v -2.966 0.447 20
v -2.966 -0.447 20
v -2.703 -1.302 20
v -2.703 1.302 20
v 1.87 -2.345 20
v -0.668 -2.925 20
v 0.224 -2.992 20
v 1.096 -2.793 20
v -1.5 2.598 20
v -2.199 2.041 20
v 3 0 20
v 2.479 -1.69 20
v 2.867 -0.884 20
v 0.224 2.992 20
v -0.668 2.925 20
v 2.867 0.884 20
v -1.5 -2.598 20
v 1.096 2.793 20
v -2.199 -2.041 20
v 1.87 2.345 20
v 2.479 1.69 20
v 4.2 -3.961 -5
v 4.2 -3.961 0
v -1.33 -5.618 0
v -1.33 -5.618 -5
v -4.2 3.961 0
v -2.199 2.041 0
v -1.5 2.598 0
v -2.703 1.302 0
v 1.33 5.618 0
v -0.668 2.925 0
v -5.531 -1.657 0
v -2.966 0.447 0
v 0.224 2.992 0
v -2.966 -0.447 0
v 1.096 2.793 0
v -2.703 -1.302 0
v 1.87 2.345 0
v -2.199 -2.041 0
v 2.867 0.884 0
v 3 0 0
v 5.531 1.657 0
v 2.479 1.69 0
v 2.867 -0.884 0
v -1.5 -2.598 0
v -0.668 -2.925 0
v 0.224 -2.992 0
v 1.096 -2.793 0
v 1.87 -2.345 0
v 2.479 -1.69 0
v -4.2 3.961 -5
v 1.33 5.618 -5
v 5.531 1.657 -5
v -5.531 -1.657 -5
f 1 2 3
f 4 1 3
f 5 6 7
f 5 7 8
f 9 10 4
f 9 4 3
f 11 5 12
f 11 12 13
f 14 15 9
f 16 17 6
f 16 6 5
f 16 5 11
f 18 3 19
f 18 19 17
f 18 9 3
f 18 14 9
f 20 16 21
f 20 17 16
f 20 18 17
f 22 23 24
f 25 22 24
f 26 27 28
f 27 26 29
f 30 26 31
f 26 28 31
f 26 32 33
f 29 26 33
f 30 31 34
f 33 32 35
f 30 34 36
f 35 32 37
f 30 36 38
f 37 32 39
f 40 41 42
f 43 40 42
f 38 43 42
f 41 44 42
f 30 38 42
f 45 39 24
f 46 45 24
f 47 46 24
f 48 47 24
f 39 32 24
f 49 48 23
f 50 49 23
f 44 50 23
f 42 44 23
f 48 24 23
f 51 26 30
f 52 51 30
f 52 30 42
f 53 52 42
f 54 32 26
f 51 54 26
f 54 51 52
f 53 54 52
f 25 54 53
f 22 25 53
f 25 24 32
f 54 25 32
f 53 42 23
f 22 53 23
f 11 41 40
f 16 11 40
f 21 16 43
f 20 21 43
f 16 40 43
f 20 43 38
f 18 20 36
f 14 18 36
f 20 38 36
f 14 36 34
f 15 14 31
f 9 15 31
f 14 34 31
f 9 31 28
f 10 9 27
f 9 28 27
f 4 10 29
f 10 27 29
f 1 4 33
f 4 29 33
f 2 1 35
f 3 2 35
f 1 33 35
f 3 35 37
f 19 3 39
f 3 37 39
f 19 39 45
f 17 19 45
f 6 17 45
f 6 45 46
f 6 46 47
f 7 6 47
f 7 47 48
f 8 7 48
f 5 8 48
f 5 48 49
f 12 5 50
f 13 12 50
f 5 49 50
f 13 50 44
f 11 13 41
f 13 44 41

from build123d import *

# Parameters (mm, degrees)
F0_R     = 3
F1_DEPTH = 20
F2_R     = 3
F3_DEPTH = 5


with BuildPart() as f1:
    # F0 (on Top) → F1 (new body)
    with BuildSketch(Plane.XY):
        Circle(F0_R)
    extrude(amount=F1_DEPTH)

    # F2 (on face) → F3 (join)
    with BuildSketch(Plane(origin=(0, 0, 0), x_dir=(1, 0, 0), z_dir=(0, 0, -1))):
        Polygon((1.3301522364, -5.6181872843), (5.5305690296, -1.6571480145), (4.2004167932, 3.9610392698), (-1.3301522364, 5.6181872843), (-5.5305690296, 1.6571480145), (-4.2004167932, -3.9610392698), align=None)
        Circle(F2_R, mode=Mode.SUBTRACT)
        Circle(F2_R)
    extrude(amount=F3_DEPTH)


solid = f1.part
